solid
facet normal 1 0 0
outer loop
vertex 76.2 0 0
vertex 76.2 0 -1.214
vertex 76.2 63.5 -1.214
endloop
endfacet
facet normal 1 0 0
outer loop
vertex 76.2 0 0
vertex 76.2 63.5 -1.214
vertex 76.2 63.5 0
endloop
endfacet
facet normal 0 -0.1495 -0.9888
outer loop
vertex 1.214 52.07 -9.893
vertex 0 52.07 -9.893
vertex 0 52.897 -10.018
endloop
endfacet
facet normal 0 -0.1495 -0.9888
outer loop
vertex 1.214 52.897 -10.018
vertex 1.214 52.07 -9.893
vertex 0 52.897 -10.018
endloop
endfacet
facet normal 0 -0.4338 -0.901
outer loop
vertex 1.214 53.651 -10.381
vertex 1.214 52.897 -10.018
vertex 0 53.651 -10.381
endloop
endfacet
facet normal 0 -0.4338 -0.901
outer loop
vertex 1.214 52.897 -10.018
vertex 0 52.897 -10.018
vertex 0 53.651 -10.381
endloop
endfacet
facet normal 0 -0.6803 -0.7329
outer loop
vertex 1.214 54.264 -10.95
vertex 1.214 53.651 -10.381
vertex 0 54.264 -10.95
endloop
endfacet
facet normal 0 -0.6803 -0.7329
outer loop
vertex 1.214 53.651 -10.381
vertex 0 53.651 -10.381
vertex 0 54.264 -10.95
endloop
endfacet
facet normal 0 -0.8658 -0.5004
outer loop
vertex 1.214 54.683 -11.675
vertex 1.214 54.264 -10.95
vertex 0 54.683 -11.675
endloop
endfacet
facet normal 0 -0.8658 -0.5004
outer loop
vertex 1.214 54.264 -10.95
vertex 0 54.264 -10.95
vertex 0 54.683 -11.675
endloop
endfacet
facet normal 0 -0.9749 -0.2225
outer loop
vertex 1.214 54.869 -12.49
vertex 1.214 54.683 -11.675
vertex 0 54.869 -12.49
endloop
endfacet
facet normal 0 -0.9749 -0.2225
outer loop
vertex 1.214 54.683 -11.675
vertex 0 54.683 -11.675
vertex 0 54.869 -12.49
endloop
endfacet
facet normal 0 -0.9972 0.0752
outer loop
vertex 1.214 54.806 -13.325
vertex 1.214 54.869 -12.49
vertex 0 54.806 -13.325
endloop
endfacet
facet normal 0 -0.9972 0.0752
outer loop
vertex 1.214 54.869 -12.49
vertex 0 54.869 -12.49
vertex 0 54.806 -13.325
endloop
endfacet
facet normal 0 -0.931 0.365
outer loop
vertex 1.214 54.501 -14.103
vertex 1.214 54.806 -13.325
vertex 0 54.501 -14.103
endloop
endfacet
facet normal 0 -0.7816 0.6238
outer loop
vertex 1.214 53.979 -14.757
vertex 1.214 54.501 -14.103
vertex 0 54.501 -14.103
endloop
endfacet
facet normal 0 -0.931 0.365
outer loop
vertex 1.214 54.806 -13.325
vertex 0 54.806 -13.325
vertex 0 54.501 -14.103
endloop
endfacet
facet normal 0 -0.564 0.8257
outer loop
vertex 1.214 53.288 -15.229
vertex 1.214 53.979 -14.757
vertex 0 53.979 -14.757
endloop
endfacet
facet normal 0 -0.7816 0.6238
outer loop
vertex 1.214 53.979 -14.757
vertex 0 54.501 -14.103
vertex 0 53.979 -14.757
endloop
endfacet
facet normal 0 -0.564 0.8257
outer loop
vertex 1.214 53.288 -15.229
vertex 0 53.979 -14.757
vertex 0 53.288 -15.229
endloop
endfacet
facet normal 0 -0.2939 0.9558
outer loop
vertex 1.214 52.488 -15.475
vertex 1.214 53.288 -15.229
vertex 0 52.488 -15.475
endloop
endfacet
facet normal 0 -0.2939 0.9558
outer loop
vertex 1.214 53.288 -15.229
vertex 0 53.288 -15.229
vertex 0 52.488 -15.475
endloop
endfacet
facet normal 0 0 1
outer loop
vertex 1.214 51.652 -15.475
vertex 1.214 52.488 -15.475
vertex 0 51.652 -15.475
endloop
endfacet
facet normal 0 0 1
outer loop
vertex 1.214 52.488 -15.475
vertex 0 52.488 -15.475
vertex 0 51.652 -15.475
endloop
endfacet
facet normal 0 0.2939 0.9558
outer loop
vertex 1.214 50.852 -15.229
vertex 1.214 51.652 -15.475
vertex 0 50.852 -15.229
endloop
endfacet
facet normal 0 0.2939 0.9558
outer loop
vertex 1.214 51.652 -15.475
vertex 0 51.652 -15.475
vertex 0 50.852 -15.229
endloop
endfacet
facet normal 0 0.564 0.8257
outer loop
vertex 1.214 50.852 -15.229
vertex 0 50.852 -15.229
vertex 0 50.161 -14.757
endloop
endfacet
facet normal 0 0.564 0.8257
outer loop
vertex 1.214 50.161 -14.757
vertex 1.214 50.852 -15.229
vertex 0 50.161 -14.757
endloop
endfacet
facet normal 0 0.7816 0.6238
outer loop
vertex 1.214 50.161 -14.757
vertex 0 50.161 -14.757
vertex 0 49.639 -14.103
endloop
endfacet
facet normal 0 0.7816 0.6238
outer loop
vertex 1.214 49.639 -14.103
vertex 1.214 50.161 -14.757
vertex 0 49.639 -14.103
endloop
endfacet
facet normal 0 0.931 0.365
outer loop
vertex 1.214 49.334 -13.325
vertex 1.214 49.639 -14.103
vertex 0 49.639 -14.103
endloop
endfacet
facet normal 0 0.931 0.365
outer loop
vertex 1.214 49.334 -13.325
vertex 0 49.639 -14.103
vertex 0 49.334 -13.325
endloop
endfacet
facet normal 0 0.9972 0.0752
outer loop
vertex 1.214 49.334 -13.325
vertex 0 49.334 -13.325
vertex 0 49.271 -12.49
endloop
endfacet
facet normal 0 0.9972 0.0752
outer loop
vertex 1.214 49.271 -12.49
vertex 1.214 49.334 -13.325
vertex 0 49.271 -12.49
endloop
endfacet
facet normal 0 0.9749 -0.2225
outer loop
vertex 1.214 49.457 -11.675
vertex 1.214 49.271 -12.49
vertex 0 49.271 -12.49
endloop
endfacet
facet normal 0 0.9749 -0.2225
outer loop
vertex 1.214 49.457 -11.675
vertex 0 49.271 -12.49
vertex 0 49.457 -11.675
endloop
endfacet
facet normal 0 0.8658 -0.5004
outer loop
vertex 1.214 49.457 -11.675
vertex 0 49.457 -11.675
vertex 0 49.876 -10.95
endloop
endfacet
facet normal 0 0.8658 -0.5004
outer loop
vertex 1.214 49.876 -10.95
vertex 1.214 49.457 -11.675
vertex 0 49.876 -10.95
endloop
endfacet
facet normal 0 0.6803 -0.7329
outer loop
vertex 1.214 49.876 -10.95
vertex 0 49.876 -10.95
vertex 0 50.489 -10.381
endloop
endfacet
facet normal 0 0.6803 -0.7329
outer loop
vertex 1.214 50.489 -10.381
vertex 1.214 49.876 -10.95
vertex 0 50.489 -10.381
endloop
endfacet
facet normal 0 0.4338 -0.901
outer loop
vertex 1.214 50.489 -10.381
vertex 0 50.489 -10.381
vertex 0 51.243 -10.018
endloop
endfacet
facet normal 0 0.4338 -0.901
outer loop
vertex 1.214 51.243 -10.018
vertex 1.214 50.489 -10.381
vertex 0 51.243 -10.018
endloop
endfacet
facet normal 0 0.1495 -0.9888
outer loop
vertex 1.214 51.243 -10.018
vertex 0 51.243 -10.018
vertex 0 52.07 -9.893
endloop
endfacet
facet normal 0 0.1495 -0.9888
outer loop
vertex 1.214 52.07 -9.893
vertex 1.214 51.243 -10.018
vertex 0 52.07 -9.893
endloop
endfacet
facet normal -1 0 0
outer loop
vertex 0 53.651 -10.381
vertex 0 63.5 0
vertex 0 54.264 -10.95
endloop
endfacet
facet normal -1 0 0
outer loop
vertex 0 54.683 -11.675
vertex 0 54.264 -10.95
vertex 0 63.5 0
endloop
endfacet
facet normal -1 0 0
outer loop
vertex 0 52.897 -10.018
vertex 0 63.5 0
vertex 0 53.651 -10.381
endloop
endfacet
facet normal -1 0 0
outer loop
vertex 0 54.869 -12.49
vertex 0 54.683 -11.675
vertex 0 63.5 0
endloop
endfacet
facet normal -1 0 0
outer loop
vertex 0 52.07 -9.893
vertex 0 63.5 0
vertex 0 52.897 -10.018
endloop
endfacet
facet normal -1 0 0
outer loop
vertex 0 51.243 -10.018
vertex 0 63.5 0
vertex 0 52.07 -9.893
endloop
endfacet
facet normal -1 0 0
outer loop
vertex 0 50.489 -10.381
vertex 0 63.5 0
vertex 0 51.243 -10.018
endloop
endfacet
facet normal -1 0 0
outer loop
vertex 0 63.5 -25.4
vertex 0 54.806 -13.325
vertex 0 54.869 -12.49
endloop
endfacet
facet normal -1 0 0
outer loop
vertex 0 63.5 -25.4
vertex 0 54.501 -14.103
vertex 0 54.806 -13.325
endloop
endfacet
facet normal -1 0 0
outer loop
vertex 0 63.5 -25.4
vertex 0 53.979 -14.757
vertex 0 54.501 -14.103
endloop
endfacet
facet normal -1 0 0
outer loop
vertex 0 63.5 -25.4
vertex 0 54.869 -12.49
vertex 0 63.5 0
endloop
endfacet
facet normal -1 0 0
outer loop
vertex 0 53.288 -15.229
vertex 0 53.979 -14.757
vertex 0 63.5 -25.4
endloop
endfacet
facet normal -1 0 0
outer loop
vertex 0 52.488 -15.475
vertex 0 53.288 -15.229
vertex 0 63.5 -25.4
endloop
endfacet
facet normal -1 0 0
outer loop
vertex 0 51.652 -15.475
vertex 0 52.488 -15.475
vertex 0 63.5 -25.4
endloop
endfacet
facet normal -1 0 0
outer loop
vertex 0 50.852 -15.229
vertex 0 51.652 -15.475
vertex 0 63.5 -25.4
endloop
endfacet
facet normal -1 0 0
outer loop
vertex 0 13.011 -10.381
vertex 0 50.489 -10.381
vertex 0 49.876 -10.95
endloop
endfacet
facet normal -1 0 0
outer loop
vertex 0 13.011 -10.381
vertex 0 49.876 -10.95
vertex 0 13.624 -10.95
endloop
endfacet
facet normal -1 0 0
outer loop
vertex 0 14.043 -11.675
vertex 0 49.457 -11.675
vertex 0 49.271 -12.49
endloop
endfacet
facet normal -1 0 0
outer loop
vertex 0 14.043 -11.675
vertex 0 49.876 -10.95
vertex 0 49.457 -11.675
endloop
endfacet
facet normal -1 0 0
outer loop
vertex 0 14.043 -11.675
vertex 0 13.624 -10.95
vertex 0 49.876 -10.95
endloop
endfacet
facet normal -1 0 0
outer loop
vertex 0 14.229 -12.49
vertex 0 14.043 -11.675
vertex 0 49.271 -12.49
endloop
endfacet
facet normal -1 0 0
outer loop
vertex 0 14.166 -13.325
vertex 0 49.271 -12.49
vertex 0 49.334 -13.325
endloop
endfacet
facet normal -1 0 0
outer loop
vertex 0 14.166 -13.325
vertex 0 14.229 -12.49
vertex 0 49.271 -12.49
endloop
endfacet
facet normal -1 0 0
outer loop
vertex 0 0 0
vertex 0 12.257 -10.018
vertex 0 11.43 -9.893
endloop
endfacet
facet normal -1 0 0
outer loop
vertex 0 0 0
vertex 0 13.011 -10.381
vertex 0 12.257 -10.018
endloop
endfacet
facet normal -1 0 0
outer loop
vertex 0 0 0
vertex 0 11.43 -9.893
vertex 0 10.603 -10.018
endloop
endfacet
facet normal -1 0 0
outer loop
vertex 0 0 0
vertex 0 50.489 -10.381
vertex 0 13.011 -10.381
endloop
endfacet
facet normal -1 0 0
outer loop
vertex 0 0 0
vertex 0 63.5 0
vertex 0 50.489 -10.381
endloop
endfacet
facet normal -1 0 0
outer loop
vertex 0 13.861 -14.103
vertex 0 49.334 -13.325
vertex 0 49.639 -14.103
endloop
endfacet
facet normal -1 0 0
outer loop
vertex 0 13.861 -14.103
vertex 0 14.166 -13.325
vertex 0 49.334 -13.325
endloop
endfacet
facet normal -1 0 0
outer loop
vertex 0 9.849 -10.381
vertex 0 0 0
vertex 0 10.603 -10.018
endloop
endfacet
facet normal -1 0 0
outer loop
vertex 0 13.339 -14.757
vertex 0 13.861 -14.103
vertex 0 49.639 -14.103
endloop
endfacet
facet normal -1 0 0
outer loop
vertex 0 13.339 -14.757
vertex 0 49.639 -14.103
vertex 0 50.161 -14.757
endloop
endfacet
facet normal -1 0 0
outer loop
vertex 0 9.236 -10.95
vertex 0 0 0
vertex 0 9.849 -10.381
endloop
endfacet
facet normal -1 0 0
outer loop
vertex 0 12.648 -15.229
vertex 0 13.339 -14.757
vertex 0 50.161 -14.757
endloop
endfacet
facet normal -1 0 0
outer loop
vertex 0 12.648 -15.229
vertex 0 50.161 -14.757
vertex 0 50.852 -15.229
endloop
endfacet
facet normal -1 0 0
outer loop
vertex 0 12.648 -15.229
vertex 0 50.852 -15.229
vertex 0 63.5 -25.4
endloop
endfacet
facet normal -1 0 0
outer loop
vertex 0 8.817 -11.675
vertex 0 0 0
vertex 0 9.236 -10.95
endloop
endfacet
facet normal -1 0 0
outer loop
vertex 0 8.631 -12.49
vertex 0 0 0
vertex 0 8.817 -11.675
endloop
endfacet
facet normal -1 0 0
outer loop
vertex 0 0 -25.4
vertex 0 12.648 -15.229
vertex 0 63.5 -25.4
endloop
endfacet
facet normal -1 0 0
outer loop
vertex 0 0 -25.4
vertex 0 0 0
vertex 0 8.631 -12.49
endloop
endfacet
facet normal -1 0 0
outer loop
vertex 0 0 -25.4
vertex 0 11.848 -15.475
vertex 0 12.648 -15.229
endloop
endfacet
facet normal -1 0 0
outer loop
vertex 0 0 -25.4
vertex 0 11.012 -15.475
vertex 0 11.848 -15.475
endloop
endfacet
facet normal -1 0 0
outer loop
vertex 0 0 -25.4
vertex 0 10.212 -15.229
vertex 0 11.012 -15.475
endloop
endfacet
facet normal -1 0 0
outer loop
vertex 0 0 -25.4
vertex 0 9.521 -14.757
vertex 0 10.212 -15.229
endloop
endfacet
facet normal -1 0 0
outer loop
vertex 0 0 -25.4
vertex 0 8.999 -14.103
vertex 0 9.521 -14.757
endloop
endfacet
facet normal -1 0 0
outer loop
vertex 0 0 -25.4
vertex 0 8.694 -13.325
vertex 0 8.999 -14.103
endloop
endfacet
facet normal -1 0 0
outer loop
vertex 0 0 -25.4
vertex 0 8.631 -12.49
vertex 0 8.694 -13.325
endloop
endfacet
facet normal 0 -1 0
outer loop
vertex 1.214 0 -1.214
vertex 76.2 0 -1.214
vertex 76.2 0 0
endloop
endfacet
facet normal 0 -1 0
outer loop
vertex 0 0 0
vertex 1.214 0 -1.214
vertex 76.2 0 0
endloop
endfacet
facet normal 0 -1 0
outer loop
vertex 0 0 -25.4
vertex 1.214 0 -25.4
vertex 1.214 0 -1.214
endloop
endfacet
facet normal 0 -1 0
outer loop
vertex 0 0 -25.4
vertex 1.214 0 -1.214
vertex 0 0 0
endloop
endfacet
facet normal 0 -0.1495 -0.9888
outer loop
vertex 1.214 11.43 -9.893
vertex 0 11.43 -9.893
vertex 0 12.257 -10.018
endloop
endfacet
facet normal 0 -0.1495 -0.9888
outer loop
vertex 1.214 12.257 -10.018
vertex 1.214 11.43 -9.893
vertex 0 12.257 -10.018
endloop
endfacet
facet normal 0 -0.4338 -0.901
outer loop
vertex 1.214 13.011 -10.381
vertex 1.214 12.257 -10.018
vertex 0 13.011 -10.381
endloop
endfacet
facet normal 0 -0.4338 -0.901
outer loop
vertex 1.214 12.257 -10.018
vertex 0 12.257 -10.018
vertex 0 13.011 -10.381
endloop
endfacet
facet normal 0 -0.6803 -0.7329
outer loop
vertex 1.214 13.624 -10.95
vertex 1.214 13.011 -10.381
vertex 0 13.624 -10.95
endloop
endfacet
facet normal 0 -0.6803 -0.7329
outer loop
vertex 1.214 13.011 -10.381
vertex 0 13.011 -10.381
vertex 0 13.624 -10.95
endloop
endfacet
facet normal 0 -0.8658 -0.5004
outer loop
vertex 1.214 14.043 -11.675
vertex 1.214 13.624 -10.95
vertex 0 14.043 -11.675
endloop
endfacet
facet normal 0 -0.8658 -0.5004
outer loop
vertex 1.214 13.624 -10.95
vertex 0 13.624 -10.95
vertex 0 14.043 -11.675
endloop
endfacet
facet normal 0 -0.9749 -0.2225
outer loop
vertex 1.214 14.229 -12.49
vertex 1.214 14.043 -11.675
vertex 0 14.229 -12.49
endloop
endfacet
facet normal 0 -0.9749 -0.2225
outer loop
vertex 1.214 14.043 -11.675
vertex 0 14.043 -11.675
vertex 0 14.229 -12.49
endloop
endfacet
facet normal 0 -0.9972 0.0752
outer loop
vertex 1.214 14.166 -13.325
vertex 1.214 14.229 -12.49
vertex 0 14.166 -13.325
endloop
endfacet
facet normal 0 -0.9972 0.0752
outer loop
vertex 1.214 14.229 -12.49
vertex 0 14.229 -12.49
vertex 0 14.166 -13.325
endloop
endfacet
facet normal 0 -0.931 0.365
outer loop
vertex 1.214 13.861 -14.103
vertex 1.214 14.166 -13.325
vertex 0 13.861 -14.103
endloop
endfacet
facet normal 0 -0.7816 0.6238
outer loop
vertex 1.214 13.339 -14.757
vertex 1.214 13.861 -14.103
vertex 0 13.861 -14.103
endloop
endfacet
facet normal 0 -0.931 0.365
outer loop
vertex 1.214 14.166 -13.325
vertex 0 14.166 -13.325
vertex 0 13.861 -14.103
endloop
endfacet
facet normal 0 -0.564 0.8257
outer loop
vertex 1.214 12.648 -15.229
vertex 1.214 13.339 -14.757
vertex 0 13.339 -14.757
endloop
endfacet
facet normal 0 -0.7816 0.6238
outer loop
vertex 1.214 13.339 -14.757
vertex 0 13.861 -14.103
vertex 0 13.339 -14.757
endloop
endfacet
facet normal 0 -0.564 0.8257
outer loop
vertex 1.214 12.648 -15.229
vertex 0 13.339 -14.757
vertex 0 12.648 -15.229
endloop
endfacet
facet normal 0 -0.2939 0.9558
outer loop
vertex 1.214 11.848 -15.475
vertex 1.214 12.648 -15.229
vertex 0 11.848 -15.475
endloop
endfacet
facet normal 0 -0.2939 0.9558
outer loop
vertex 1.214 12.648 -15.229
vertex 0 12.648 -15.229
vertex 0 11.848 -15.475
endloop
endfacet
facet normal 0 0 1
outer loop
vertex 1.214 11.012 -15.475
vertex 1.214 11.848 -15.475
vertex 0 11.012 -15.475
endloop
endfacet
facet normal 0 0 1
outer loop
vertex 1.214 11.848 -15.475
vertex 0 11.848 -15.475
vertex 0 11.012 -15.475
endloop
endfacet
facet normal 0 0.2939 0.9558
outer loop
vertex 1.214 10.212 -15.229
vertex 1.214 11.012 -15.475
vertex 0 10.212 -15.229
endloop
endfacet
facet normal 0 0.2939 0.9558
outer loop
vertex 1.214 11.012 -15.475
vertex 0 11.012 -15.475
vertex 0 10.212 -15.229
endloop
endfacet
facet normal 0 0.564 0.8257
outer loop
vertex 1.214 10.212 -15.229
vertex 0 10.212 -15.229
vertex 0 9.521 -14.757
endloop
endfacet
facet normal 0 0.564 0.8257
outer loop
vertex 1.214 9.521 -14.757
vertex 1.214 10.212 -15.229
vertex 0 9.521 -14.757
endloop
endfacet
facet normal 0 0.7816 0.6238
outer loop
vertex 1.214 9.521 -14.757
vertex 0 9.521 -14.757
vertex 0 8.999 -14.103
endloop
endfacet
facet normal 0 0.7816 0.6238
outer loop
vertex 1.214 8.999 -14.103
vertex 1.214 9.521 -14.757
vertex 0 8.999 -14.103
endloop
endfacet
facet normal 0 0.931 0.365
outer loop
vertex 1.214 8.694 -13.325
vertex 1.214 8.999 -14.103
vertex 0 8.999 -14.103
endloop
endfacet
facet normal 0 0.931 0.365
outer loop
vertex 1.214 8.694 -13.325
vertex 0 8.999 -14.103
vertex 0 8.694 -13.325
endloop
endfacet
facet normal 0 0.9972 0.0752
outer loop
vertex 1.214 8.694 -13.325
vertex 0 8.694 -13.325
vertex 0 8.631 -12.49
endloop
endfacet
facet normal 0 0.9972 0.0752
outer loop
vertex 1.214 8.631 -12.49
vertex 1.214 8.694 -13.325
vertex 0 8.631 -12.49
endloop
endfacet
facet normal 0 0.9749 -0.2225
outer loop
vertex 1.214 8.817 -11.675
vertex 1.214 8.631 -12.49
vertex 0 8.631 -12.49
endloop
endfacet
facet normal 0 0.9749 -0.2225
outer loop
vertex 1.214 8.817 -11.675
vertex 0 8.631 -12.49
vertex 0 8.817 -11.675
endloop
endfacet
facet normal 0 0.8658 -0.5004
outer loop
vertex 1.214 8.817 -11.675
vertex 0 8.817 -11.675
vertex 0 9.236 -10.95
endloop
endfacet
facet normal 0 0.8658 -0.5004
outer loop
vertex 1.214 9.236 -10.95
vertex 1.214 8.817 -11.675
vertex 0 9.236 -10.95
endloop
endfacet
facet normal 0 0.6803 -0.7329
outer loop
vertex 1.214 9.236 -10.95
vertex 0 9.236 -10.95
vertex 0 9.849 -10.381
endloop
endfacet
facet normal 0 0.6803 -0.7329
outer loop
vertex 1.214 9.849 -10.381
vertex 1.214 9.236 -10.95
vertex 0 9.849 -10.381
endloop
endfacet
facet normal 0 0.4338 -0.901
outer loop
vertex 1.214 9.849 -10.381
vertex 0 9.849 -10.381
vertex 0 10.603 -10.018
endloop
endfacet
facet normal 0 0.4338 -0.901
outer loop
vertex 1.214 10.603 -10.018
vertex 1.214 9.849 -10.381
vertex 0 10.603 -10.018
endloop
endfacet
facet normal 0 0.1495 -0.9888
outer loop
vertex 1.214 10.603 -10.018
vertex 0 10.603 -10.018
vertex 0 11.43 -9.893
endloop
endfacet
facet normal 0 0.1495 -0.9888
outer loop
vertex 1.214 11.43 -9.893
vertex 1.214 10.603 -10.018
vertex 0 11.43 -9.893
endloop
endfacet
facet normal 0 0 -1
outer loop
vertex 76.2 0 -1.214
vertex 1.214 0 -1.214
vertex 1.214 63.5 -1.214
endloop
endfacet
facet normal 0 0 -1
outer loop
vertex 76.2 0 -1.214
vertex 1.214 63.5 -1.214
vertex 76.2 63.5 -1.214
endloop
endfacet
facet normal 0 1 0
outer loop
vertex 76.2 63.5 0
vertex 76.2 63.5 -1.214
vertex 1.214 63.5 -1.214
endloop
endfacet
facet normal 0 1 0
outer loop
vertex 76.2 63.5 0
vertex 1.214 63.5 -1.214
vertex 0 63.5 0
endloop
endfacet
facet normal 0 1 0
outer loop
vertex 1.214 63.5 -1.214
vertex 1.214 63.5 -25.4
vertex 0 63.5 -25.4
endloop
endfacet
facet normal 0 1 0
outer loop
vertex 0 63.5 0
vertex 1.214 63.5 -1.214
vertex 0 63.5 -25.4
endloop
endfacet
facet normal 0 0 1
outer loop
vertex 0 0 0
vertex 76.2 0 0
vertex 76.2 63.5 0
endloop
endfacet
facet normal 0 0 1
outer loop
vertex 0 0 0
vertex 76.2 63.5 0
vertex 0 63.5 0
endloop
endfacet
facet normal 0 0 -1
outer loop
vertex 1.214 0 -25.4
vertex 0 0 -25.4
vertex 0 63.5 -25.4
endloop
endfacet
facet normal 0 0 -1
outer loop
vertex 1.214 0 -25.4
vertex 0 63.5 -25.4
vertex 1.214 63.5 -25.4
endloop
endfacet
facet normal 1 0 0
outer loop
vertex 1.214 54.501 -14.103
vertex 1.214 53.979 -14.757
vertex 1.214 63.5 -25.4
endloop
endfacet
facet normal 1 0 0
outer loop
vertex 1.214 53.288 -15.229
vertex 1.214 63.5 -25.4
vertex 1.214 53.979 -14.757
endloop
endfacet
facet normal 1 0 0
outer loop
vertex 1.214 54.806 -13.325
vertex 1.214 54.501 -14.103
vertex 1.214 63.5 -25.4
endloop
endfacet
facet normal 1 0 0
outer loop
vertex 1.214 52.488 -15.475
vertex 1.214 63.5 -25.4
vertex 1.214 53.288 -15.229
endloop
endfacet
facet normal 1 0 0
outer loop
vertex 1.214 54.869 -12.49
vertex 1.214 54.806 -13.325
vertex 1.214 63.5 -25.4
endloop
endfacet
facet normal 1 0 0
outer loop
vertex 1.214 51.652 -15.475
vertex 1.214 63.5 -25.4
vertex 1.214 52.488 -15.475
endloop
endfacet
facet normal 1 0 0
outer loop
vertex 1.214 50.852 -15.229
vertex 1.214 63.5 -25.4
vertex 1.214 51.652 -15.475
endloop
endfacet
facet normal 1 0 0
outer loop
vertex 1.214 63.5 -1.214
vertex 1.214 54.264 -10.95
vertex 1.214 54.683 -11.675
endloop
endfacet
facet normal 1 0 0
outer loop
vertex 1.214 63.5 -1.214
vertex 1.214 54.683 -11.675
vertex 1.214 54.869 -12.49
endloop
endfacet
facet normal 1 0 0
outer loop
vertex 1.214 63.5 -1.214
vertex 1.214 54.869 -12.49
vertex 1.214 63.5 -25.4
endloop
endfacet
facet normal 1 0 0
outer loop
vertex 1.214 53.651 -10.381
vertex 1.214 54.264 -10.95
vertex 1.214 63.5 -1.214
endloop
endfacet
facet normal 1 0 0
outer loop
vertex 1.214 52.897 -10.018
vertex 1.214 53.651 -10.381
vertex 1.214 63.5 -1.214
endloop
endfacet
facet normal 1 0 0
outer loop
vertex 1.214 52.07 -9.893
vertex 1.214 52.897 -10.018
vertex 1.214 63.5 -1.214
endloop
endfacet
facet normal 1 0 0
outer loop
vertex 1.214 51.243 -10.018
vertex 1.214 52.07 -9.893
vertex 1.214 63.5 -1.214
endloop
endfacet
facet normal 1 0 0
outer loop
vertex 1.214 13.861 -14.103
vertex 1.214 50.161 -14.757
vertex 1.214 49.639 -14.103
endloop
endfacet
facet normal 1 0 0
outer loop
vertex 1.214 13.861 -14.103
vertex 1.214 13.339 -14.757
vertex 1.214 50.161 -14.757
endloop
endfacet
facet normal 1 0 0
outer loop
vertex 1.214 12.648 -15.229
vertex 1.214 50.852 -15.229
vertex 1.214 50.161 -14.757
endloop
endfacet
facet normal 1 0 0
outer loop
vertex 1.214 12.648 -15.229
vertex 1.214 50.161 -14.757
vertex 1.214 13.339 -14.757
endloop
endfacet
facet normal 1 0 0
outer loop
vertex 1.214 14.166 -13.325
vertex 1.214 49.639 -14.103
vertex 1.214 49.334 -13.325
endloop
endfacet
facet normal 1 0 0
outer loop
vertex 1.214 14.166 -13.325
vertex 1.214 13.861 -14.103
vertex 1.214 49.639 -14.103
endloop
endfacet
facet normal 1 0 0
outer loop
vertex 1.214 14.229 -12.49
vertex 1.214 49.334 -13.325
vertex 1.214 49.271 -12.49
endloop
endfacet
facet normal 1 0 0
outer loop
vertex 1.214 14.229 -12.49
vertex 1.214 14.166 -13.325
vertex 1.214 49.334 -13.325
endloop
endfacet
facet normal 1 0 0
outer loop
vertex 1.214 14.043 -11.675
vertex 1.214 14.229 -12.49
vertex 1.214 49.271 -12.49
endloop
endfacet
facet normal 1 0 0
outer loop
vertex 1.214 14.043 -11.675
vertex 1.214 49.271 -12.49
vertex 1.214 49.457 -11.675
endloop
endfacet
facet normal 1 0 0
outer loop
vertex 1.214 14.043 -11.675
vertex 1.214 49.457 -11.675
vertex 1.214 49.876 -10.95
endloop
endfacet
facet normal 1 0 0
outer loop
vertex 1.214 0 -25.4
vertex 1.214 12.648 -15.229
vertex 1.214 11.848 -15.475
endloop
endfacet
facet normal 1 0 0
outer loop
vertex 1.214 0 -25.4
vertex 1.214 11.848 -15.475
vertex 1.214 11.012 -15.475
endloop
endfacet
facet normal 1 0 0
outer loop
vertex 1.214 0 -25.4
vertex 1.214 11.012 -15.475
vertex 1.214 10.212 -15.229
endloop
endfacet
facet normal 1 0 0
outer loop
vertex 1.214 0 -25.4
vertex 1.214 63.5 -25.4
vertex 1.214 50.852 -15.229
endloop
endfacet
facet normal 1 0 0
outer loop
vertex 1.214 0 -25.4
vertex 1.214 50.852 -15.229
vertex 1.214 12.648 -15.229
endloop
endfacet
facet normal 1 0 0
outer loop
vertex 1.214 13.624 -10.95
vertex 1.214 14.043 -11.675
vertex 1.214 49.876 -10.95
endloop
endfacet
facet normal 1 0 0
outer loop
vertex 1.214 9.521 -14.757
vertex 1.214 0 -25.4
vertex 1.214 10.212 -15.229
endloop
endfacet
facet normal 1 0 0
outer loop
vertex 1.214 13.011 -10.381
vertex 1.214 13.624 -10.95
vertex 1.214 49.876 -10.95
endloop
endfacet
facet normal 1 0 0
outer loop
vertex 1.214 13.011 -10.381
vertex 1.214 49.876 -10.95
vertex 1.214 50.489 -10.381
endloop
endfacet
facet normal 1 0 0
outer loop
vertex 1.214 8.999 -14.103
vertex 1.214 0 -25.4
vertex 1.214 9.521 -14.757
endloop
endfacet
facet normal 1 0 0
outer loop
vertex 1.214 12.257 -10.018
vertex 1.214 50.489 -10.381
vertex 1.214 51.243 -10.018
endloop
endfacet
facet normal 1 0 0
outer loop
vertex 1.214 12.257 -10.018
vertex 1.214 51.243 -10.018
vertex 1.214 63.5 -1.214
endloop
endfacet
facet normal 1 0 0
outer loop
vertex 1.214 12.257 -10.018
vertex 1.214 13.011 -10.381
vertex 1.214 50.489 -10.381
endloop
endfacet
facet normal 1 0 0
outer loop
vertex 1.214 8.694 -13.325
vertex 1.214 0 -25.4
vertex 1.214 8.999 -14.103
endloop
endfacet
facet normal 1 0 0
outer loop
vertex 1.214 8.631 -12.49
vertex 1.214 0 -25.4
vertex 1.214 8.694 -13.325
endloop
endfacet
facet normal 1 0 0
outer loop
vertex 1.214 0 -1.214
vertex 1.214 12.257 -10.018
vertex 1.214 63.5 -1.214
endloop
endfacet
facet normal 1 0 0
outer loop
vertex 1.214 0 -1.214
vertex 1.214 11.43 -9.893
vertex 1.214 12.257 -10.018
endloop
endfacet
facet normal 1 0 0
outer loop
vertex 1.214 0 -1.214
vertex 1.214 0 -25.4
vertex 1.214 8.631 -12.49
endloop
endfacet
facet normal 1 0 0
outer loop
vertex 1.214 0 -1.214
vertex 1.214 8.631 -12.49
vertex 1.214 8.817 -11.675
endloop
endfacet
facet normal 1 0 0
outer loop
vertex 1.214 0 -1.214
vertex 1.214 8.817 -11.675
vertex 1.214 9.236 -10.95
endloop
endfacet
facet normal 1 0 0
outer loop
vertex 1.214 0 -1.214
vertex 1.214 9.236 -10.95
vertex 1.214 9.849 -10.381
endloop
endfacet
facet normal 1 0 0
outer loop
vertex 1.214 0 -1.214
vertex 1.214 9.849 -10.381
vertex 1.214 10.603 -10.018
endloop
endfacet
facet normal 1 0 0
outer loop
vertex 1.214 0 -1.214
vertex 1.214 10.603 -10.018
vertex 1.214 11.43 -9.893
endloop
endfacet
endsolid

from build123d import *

# Parameters (mm, degrees)
BOSS_EXTRUDE1_DEPTH = 63.5
SKETCH3_R           = 2.8067
CUT_EXTRUDE1_DEPTH  = 2.54


with BuildPart() as part:
    # Sketch2 → Boss-Extrude1 (new body)
    with BuildSketch(Plane(origin=(0, 0, 0), x_dir=(1, 0, 0), z_dir=(0, 1, 0))):
        Polygon((0, 0), (0, 25.4), (1.21412, 25.4), (1.21412, 1.21412), (76.2, 1.21412), (76.2, 0), align=None)
    extrude(amount=BOSS_EXTRUDE1_DEPTH)

    # Sketch3 → Cut-Extrude1 (cut)
    with BuildSketch(Plane.ZY):
        with Locations((-12.7, 52.07)):
            Circle(SKETCH3_R)
        with Locations((-12.7, 11.43)):
            Circle(SKETCH3_R)
    extrude(amount=-CUT_EXTRUDE1_DEPTH, mode=Mode.SUBTRACT)


solid = part.part
